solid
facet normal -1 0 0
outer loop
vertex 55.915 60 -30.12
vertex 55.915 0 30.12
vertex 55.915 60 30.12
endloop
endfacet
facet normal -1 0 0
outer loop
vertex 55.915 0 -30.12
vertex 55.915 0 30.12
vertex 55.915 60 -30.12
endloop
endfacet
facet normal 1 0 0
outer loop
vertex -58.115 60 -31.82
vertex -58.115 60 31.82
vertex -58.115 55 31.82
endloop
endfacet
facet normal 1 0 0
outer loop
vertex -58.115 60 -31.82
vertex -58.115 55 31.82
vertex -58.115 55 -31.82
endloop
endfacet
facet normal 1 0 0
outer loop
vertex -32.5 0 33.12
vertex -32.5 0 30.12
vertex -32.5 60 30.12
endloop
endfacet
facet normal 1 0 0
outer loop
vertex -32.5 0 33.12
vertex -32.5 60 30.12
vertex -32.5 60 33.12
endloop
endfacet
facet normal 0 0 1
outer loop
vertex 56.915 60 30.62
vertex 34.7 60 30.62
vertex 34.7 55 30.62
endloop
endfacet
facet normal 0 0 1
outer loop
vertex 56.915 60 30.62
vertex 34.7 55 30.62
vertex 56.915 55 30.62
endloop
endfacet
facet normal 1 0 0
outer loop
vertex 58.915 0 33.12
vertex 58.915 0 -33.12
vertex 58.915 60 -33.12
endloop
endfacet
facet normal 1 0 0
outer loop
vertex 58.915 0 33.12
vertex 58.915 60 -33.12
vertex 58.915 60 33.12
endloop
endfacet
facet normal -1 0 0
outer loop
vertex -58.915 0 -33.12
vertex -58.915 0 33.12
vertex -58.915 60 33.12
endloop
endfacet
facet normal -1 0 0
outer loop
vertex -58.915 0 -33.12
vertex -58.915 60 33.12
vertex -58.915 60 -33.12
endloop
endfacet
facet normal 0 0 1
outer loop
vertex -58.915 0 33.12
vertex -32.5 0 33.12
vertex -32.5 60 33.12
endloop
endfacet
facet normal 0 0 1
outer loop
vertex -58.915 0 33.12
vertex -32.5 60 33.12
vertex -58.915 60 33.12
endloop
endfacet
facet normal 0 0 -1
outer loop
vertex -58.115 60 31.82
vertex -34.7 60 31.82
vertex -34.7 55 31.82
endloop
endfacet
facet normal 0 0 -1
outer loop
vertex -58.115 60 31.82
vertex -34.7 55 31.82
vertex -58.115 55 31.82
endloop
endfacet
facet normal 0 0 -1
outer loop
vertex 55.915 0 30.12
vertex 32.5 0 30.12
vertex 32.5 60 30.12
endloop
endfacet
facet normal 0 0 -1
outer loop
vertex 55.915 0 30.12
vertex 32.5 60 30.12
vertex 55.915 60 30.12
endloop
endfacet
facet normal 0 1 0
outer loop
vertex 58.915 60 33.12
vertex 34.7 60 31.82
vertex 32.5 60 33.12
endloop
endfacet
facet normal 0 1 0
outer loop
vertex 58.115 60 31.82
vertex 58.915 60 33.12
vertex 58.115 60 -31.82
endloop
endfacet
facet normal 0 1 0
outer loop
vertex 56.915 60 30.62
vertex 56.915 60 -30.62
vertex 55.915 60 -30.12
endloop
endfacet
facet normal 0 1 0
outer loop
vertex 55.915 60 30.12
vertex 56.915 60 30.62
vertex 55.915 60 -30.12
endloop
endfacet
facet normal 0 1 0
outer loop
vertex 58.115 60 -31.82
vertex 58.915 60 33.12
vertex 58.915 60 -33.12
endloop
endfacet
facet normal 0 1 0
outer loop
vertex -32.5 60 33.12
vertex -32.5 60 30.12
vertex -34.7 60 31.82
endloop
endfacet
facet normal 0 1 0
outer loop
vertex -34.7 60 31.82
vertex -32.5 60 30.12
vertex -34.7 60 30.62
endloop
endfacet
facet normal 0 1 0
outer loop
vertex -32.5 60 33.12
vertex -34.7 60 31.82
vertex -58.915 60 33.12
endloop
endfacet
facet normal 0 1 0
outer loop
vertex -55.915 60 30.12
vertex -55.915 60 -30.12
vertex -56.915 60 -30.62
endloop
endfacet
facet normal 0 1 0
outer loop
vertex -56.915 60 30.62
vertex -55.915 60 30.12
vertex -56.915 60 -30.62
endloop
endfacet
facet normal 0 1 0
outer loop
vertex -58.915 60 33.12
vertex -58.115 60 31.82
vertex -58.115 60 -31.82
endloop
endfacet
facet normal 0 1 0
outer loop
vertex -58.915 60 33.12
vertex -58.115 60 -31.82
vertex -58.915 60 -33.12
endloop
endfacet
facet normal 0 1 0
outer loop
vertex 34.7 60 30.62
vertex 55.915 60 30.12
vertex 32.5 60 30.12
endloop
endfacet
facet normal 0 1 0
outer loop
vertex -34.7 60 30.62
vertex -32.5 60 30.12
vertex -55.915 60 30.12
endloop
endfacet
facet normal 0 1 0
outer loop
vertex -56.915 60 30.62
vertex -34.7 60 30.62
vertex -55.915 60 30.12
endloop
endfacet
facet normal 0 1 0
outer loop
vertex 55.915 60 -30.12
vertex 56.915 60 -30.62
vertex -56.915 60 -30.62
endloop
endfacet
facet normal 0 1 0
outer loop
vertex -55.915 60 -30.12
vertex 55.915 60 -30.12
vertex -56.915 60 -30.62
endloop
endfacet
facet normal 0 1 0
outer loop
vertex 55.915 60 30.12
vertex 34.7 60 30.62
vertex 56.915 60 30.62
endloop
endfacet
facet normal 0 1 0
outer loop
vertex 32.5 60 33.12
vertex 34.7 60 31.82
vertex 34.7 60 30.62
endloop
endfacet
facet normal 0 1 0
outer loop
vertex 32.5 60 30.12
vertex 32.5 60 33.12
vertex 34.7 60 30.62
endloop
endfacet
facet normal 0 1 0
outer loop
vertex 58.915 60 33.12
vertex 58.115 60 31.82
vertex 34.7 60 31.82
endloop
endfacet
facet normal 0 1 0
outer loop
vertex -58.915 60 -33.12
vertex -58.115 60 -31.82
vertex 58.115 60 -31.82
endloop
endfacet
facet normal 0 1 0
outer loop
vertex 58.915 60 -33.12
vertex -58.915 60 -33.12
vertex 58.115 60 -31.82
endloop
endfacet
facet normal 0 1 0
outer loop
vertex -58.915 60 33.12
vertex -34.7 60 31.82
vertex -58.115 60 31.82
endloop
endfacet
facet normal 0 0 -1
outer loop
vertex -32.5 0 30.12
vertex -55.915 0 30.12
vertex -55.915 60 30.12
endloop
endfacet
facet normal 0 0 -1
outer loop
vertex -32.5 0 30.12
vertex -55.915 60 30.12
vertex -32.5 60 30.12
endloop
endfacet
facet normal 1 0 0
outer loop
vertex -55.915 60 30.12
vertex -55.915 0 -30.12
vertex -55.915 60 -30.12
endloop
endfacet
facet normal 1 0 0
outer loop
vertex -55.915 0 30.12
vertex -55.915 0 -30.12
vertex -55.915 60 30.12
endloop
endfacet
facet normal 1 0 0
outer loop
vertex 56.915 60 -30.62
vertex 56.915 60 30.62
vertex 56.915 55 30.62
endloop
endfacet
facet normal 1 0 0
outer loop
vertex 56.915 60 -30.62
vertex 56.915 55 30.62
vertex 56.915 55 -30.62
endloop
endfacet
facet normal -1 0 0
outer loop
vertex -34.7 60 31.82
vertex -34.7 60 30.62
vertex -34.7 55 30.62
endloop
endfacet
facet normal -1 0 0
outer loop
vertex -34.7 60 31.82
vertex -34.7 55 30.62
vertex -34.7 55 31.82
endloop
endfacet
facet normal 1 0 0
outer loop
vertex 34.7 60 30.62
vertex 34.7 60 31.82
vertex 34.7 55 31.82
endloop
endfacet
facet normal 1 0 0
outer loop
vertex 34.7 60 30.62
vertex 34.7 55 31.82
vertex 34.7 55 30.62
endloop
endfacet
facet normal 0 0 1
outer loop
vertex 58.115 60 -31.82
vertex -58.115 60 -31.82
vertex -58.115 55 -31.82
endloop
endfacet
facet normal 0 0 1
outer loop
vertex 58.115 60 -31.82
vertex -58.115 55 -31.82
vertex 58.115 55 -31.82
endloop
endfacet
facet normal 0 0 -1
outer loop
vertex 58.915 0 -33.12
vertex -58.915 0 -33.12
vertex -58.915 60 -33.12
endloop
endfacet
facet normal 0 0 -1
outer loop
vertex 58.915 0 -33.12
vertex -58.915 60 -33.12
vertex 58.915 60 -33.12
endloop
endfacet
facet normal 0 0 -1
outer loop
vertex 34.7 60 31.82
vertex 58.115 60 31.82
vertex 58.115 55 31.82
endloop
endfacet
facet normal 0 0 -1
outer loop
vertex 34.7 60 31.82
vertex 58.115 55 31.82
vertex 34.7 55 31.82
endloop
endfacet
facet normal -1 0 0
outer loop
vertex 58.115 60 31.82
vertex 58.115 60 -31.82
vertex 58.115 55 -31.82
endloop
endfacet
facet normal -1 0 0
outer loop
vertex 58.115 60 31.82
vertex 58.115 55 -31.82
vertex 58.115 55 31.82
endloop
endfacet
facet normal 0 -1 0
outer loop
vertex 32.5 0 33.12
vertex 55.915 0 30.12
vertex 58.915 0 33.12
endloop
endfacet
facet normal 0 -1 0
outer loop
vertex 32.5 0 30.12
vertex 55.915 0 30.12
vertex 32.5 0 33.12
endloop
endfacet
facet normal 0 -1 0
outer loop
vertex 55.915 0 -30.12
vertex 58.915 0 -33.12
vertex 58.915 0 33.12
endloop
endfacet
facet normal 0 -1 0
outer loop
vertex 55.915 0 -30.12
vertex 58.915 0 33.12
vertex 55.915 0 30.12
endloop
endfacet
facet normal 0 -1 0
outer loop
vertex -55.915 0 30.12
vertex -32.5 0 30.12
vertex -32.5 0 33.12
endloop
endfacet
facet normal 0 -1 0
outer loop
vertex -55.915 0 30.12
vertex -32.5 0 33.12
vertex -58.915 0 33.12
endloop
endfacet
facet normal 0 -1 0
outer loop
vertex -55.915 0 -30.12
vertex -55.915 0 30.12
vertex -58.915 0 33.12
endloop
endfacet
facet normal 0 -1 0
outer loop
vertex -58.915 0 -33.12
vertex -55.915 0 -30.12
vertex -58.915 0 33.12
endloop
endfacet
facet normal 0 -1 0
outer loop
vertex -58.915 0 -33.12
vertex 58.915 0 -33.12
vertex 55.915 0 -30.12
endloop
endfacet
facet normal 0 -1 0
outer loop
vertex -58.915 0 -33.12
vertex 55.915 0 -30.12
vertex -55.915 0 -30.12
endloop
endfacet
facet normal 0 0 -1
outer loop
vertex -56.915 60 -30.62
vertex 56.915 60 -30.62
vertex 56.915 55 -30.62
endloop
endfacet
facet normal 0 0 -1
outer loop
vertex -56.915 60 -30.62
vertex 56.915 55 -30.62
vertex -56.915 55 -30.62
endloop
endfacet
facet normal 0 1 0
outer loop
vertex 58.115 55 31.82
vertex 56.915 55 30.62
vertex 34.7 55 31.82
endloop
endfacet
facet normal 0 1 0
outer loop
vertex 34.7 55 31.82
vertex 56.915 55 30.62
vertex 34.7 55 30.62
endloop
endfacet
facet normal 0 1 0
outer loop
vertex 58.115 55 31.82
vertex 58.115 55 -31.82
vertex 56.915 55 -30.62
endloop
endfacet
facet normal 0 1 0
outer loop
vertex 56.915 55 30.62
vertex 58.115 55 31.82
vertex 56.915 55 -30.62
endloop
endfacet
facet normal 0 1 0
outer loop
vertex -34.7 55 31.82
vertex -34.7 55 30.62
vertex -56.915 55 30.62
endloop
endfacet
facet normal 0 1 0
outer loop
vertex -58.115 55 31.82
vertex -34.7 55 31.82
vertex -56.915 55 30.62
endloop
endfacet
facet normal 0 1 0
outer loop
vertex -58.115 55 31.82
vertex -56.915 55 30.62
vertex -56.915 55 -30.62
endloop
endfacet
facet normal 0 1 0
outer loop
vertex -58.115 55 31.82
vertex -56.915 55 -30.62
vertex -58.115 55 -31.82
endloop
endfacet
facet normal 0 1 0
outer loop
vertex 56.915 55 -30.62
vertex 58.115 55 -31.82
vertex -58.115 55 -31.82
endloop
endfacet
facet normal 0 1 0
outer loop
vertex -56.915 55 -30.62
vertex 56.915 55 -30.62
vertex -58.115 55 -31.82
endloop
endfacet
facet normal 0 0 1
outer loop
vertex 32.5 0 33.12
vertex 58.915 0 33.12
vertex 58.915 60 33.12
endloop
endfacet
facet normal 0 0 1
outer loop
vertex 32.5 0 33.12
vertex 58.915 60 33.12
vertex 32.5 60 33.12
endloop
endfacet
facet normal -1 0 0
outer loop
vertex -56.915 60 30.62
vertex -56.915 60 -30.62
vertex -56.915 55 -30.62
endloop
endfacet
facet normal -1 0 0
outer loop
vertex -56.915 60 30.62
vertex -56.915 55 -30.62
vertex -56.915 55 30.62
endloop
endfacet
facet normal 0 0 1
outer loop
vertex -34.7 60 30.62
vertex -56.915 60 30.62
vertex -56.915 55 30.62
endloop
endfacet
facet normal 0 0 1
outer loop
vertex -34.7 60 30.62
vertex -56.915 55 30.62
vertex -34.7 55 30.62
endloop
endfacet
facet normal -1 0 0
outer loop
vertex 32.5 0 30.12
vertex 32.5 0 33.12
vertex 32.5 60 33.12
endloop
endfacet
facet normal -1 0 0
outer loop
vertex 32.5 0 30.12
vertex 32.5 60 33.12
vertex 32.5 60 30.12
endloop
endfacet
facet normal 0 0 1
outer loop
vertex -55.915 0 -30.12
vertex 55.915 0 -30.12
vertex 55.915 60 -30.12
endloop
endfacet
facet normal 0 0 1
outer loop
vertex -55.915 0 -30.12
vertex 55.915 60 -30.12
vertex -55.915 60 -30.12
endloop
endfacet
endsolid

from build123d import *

# Parameters (mm, degrees)
BOSS_EXTRUDE1_DEPTH = 60
CUT_EXTRUDE1_DEPTH  = 5


with BuildPart() as part:
    # Sketch1 → Boss-Extrude1 (new body)
    with BuildSketch(Plane(origin=(0, 0, 0), x_dir=(1, 0, 0), z_dir=(0, 1, 0))):
        Polygon((-32.5, -30.12), (-32.5, -33.12), (-58.915, -33.12), (-58.915, 33.12), (58.915, 33.12), (58.915, -33.12), (32.5, -33.12), (32.5, -30.12), (55.915, -30.12), (55.915, 30.12), (-55.915, 30.12), (-55.915, -30.12), align=None)
    extrude(amount=BOSS_EXTRUDE1_DEPTH)

    # Sketch2 → Cut-Extrude1 (cut)
    with BuildSketch(Plane(origin=(0, 60, 0), x_dir=(1, 0, 0), z_dir=(0, 1, 0))):
        Polygon((-34.7, -30.62), (-34.7, -31.82), (-58.115, -31.82), (-58.115, 31.82), (58.115, 31.82), (58.115, -31.82), (34.7, -31.82), (34.7, -30.62), (56.915, -30.62), (56.915, 30.62), (-56.915, 30.62), (-56.915, -30.62), align=None)
    extrude(amount=-CUT_EXTRUDE1_DEPTH, mode=Mode.SUBTRACT)


solid = part.part
